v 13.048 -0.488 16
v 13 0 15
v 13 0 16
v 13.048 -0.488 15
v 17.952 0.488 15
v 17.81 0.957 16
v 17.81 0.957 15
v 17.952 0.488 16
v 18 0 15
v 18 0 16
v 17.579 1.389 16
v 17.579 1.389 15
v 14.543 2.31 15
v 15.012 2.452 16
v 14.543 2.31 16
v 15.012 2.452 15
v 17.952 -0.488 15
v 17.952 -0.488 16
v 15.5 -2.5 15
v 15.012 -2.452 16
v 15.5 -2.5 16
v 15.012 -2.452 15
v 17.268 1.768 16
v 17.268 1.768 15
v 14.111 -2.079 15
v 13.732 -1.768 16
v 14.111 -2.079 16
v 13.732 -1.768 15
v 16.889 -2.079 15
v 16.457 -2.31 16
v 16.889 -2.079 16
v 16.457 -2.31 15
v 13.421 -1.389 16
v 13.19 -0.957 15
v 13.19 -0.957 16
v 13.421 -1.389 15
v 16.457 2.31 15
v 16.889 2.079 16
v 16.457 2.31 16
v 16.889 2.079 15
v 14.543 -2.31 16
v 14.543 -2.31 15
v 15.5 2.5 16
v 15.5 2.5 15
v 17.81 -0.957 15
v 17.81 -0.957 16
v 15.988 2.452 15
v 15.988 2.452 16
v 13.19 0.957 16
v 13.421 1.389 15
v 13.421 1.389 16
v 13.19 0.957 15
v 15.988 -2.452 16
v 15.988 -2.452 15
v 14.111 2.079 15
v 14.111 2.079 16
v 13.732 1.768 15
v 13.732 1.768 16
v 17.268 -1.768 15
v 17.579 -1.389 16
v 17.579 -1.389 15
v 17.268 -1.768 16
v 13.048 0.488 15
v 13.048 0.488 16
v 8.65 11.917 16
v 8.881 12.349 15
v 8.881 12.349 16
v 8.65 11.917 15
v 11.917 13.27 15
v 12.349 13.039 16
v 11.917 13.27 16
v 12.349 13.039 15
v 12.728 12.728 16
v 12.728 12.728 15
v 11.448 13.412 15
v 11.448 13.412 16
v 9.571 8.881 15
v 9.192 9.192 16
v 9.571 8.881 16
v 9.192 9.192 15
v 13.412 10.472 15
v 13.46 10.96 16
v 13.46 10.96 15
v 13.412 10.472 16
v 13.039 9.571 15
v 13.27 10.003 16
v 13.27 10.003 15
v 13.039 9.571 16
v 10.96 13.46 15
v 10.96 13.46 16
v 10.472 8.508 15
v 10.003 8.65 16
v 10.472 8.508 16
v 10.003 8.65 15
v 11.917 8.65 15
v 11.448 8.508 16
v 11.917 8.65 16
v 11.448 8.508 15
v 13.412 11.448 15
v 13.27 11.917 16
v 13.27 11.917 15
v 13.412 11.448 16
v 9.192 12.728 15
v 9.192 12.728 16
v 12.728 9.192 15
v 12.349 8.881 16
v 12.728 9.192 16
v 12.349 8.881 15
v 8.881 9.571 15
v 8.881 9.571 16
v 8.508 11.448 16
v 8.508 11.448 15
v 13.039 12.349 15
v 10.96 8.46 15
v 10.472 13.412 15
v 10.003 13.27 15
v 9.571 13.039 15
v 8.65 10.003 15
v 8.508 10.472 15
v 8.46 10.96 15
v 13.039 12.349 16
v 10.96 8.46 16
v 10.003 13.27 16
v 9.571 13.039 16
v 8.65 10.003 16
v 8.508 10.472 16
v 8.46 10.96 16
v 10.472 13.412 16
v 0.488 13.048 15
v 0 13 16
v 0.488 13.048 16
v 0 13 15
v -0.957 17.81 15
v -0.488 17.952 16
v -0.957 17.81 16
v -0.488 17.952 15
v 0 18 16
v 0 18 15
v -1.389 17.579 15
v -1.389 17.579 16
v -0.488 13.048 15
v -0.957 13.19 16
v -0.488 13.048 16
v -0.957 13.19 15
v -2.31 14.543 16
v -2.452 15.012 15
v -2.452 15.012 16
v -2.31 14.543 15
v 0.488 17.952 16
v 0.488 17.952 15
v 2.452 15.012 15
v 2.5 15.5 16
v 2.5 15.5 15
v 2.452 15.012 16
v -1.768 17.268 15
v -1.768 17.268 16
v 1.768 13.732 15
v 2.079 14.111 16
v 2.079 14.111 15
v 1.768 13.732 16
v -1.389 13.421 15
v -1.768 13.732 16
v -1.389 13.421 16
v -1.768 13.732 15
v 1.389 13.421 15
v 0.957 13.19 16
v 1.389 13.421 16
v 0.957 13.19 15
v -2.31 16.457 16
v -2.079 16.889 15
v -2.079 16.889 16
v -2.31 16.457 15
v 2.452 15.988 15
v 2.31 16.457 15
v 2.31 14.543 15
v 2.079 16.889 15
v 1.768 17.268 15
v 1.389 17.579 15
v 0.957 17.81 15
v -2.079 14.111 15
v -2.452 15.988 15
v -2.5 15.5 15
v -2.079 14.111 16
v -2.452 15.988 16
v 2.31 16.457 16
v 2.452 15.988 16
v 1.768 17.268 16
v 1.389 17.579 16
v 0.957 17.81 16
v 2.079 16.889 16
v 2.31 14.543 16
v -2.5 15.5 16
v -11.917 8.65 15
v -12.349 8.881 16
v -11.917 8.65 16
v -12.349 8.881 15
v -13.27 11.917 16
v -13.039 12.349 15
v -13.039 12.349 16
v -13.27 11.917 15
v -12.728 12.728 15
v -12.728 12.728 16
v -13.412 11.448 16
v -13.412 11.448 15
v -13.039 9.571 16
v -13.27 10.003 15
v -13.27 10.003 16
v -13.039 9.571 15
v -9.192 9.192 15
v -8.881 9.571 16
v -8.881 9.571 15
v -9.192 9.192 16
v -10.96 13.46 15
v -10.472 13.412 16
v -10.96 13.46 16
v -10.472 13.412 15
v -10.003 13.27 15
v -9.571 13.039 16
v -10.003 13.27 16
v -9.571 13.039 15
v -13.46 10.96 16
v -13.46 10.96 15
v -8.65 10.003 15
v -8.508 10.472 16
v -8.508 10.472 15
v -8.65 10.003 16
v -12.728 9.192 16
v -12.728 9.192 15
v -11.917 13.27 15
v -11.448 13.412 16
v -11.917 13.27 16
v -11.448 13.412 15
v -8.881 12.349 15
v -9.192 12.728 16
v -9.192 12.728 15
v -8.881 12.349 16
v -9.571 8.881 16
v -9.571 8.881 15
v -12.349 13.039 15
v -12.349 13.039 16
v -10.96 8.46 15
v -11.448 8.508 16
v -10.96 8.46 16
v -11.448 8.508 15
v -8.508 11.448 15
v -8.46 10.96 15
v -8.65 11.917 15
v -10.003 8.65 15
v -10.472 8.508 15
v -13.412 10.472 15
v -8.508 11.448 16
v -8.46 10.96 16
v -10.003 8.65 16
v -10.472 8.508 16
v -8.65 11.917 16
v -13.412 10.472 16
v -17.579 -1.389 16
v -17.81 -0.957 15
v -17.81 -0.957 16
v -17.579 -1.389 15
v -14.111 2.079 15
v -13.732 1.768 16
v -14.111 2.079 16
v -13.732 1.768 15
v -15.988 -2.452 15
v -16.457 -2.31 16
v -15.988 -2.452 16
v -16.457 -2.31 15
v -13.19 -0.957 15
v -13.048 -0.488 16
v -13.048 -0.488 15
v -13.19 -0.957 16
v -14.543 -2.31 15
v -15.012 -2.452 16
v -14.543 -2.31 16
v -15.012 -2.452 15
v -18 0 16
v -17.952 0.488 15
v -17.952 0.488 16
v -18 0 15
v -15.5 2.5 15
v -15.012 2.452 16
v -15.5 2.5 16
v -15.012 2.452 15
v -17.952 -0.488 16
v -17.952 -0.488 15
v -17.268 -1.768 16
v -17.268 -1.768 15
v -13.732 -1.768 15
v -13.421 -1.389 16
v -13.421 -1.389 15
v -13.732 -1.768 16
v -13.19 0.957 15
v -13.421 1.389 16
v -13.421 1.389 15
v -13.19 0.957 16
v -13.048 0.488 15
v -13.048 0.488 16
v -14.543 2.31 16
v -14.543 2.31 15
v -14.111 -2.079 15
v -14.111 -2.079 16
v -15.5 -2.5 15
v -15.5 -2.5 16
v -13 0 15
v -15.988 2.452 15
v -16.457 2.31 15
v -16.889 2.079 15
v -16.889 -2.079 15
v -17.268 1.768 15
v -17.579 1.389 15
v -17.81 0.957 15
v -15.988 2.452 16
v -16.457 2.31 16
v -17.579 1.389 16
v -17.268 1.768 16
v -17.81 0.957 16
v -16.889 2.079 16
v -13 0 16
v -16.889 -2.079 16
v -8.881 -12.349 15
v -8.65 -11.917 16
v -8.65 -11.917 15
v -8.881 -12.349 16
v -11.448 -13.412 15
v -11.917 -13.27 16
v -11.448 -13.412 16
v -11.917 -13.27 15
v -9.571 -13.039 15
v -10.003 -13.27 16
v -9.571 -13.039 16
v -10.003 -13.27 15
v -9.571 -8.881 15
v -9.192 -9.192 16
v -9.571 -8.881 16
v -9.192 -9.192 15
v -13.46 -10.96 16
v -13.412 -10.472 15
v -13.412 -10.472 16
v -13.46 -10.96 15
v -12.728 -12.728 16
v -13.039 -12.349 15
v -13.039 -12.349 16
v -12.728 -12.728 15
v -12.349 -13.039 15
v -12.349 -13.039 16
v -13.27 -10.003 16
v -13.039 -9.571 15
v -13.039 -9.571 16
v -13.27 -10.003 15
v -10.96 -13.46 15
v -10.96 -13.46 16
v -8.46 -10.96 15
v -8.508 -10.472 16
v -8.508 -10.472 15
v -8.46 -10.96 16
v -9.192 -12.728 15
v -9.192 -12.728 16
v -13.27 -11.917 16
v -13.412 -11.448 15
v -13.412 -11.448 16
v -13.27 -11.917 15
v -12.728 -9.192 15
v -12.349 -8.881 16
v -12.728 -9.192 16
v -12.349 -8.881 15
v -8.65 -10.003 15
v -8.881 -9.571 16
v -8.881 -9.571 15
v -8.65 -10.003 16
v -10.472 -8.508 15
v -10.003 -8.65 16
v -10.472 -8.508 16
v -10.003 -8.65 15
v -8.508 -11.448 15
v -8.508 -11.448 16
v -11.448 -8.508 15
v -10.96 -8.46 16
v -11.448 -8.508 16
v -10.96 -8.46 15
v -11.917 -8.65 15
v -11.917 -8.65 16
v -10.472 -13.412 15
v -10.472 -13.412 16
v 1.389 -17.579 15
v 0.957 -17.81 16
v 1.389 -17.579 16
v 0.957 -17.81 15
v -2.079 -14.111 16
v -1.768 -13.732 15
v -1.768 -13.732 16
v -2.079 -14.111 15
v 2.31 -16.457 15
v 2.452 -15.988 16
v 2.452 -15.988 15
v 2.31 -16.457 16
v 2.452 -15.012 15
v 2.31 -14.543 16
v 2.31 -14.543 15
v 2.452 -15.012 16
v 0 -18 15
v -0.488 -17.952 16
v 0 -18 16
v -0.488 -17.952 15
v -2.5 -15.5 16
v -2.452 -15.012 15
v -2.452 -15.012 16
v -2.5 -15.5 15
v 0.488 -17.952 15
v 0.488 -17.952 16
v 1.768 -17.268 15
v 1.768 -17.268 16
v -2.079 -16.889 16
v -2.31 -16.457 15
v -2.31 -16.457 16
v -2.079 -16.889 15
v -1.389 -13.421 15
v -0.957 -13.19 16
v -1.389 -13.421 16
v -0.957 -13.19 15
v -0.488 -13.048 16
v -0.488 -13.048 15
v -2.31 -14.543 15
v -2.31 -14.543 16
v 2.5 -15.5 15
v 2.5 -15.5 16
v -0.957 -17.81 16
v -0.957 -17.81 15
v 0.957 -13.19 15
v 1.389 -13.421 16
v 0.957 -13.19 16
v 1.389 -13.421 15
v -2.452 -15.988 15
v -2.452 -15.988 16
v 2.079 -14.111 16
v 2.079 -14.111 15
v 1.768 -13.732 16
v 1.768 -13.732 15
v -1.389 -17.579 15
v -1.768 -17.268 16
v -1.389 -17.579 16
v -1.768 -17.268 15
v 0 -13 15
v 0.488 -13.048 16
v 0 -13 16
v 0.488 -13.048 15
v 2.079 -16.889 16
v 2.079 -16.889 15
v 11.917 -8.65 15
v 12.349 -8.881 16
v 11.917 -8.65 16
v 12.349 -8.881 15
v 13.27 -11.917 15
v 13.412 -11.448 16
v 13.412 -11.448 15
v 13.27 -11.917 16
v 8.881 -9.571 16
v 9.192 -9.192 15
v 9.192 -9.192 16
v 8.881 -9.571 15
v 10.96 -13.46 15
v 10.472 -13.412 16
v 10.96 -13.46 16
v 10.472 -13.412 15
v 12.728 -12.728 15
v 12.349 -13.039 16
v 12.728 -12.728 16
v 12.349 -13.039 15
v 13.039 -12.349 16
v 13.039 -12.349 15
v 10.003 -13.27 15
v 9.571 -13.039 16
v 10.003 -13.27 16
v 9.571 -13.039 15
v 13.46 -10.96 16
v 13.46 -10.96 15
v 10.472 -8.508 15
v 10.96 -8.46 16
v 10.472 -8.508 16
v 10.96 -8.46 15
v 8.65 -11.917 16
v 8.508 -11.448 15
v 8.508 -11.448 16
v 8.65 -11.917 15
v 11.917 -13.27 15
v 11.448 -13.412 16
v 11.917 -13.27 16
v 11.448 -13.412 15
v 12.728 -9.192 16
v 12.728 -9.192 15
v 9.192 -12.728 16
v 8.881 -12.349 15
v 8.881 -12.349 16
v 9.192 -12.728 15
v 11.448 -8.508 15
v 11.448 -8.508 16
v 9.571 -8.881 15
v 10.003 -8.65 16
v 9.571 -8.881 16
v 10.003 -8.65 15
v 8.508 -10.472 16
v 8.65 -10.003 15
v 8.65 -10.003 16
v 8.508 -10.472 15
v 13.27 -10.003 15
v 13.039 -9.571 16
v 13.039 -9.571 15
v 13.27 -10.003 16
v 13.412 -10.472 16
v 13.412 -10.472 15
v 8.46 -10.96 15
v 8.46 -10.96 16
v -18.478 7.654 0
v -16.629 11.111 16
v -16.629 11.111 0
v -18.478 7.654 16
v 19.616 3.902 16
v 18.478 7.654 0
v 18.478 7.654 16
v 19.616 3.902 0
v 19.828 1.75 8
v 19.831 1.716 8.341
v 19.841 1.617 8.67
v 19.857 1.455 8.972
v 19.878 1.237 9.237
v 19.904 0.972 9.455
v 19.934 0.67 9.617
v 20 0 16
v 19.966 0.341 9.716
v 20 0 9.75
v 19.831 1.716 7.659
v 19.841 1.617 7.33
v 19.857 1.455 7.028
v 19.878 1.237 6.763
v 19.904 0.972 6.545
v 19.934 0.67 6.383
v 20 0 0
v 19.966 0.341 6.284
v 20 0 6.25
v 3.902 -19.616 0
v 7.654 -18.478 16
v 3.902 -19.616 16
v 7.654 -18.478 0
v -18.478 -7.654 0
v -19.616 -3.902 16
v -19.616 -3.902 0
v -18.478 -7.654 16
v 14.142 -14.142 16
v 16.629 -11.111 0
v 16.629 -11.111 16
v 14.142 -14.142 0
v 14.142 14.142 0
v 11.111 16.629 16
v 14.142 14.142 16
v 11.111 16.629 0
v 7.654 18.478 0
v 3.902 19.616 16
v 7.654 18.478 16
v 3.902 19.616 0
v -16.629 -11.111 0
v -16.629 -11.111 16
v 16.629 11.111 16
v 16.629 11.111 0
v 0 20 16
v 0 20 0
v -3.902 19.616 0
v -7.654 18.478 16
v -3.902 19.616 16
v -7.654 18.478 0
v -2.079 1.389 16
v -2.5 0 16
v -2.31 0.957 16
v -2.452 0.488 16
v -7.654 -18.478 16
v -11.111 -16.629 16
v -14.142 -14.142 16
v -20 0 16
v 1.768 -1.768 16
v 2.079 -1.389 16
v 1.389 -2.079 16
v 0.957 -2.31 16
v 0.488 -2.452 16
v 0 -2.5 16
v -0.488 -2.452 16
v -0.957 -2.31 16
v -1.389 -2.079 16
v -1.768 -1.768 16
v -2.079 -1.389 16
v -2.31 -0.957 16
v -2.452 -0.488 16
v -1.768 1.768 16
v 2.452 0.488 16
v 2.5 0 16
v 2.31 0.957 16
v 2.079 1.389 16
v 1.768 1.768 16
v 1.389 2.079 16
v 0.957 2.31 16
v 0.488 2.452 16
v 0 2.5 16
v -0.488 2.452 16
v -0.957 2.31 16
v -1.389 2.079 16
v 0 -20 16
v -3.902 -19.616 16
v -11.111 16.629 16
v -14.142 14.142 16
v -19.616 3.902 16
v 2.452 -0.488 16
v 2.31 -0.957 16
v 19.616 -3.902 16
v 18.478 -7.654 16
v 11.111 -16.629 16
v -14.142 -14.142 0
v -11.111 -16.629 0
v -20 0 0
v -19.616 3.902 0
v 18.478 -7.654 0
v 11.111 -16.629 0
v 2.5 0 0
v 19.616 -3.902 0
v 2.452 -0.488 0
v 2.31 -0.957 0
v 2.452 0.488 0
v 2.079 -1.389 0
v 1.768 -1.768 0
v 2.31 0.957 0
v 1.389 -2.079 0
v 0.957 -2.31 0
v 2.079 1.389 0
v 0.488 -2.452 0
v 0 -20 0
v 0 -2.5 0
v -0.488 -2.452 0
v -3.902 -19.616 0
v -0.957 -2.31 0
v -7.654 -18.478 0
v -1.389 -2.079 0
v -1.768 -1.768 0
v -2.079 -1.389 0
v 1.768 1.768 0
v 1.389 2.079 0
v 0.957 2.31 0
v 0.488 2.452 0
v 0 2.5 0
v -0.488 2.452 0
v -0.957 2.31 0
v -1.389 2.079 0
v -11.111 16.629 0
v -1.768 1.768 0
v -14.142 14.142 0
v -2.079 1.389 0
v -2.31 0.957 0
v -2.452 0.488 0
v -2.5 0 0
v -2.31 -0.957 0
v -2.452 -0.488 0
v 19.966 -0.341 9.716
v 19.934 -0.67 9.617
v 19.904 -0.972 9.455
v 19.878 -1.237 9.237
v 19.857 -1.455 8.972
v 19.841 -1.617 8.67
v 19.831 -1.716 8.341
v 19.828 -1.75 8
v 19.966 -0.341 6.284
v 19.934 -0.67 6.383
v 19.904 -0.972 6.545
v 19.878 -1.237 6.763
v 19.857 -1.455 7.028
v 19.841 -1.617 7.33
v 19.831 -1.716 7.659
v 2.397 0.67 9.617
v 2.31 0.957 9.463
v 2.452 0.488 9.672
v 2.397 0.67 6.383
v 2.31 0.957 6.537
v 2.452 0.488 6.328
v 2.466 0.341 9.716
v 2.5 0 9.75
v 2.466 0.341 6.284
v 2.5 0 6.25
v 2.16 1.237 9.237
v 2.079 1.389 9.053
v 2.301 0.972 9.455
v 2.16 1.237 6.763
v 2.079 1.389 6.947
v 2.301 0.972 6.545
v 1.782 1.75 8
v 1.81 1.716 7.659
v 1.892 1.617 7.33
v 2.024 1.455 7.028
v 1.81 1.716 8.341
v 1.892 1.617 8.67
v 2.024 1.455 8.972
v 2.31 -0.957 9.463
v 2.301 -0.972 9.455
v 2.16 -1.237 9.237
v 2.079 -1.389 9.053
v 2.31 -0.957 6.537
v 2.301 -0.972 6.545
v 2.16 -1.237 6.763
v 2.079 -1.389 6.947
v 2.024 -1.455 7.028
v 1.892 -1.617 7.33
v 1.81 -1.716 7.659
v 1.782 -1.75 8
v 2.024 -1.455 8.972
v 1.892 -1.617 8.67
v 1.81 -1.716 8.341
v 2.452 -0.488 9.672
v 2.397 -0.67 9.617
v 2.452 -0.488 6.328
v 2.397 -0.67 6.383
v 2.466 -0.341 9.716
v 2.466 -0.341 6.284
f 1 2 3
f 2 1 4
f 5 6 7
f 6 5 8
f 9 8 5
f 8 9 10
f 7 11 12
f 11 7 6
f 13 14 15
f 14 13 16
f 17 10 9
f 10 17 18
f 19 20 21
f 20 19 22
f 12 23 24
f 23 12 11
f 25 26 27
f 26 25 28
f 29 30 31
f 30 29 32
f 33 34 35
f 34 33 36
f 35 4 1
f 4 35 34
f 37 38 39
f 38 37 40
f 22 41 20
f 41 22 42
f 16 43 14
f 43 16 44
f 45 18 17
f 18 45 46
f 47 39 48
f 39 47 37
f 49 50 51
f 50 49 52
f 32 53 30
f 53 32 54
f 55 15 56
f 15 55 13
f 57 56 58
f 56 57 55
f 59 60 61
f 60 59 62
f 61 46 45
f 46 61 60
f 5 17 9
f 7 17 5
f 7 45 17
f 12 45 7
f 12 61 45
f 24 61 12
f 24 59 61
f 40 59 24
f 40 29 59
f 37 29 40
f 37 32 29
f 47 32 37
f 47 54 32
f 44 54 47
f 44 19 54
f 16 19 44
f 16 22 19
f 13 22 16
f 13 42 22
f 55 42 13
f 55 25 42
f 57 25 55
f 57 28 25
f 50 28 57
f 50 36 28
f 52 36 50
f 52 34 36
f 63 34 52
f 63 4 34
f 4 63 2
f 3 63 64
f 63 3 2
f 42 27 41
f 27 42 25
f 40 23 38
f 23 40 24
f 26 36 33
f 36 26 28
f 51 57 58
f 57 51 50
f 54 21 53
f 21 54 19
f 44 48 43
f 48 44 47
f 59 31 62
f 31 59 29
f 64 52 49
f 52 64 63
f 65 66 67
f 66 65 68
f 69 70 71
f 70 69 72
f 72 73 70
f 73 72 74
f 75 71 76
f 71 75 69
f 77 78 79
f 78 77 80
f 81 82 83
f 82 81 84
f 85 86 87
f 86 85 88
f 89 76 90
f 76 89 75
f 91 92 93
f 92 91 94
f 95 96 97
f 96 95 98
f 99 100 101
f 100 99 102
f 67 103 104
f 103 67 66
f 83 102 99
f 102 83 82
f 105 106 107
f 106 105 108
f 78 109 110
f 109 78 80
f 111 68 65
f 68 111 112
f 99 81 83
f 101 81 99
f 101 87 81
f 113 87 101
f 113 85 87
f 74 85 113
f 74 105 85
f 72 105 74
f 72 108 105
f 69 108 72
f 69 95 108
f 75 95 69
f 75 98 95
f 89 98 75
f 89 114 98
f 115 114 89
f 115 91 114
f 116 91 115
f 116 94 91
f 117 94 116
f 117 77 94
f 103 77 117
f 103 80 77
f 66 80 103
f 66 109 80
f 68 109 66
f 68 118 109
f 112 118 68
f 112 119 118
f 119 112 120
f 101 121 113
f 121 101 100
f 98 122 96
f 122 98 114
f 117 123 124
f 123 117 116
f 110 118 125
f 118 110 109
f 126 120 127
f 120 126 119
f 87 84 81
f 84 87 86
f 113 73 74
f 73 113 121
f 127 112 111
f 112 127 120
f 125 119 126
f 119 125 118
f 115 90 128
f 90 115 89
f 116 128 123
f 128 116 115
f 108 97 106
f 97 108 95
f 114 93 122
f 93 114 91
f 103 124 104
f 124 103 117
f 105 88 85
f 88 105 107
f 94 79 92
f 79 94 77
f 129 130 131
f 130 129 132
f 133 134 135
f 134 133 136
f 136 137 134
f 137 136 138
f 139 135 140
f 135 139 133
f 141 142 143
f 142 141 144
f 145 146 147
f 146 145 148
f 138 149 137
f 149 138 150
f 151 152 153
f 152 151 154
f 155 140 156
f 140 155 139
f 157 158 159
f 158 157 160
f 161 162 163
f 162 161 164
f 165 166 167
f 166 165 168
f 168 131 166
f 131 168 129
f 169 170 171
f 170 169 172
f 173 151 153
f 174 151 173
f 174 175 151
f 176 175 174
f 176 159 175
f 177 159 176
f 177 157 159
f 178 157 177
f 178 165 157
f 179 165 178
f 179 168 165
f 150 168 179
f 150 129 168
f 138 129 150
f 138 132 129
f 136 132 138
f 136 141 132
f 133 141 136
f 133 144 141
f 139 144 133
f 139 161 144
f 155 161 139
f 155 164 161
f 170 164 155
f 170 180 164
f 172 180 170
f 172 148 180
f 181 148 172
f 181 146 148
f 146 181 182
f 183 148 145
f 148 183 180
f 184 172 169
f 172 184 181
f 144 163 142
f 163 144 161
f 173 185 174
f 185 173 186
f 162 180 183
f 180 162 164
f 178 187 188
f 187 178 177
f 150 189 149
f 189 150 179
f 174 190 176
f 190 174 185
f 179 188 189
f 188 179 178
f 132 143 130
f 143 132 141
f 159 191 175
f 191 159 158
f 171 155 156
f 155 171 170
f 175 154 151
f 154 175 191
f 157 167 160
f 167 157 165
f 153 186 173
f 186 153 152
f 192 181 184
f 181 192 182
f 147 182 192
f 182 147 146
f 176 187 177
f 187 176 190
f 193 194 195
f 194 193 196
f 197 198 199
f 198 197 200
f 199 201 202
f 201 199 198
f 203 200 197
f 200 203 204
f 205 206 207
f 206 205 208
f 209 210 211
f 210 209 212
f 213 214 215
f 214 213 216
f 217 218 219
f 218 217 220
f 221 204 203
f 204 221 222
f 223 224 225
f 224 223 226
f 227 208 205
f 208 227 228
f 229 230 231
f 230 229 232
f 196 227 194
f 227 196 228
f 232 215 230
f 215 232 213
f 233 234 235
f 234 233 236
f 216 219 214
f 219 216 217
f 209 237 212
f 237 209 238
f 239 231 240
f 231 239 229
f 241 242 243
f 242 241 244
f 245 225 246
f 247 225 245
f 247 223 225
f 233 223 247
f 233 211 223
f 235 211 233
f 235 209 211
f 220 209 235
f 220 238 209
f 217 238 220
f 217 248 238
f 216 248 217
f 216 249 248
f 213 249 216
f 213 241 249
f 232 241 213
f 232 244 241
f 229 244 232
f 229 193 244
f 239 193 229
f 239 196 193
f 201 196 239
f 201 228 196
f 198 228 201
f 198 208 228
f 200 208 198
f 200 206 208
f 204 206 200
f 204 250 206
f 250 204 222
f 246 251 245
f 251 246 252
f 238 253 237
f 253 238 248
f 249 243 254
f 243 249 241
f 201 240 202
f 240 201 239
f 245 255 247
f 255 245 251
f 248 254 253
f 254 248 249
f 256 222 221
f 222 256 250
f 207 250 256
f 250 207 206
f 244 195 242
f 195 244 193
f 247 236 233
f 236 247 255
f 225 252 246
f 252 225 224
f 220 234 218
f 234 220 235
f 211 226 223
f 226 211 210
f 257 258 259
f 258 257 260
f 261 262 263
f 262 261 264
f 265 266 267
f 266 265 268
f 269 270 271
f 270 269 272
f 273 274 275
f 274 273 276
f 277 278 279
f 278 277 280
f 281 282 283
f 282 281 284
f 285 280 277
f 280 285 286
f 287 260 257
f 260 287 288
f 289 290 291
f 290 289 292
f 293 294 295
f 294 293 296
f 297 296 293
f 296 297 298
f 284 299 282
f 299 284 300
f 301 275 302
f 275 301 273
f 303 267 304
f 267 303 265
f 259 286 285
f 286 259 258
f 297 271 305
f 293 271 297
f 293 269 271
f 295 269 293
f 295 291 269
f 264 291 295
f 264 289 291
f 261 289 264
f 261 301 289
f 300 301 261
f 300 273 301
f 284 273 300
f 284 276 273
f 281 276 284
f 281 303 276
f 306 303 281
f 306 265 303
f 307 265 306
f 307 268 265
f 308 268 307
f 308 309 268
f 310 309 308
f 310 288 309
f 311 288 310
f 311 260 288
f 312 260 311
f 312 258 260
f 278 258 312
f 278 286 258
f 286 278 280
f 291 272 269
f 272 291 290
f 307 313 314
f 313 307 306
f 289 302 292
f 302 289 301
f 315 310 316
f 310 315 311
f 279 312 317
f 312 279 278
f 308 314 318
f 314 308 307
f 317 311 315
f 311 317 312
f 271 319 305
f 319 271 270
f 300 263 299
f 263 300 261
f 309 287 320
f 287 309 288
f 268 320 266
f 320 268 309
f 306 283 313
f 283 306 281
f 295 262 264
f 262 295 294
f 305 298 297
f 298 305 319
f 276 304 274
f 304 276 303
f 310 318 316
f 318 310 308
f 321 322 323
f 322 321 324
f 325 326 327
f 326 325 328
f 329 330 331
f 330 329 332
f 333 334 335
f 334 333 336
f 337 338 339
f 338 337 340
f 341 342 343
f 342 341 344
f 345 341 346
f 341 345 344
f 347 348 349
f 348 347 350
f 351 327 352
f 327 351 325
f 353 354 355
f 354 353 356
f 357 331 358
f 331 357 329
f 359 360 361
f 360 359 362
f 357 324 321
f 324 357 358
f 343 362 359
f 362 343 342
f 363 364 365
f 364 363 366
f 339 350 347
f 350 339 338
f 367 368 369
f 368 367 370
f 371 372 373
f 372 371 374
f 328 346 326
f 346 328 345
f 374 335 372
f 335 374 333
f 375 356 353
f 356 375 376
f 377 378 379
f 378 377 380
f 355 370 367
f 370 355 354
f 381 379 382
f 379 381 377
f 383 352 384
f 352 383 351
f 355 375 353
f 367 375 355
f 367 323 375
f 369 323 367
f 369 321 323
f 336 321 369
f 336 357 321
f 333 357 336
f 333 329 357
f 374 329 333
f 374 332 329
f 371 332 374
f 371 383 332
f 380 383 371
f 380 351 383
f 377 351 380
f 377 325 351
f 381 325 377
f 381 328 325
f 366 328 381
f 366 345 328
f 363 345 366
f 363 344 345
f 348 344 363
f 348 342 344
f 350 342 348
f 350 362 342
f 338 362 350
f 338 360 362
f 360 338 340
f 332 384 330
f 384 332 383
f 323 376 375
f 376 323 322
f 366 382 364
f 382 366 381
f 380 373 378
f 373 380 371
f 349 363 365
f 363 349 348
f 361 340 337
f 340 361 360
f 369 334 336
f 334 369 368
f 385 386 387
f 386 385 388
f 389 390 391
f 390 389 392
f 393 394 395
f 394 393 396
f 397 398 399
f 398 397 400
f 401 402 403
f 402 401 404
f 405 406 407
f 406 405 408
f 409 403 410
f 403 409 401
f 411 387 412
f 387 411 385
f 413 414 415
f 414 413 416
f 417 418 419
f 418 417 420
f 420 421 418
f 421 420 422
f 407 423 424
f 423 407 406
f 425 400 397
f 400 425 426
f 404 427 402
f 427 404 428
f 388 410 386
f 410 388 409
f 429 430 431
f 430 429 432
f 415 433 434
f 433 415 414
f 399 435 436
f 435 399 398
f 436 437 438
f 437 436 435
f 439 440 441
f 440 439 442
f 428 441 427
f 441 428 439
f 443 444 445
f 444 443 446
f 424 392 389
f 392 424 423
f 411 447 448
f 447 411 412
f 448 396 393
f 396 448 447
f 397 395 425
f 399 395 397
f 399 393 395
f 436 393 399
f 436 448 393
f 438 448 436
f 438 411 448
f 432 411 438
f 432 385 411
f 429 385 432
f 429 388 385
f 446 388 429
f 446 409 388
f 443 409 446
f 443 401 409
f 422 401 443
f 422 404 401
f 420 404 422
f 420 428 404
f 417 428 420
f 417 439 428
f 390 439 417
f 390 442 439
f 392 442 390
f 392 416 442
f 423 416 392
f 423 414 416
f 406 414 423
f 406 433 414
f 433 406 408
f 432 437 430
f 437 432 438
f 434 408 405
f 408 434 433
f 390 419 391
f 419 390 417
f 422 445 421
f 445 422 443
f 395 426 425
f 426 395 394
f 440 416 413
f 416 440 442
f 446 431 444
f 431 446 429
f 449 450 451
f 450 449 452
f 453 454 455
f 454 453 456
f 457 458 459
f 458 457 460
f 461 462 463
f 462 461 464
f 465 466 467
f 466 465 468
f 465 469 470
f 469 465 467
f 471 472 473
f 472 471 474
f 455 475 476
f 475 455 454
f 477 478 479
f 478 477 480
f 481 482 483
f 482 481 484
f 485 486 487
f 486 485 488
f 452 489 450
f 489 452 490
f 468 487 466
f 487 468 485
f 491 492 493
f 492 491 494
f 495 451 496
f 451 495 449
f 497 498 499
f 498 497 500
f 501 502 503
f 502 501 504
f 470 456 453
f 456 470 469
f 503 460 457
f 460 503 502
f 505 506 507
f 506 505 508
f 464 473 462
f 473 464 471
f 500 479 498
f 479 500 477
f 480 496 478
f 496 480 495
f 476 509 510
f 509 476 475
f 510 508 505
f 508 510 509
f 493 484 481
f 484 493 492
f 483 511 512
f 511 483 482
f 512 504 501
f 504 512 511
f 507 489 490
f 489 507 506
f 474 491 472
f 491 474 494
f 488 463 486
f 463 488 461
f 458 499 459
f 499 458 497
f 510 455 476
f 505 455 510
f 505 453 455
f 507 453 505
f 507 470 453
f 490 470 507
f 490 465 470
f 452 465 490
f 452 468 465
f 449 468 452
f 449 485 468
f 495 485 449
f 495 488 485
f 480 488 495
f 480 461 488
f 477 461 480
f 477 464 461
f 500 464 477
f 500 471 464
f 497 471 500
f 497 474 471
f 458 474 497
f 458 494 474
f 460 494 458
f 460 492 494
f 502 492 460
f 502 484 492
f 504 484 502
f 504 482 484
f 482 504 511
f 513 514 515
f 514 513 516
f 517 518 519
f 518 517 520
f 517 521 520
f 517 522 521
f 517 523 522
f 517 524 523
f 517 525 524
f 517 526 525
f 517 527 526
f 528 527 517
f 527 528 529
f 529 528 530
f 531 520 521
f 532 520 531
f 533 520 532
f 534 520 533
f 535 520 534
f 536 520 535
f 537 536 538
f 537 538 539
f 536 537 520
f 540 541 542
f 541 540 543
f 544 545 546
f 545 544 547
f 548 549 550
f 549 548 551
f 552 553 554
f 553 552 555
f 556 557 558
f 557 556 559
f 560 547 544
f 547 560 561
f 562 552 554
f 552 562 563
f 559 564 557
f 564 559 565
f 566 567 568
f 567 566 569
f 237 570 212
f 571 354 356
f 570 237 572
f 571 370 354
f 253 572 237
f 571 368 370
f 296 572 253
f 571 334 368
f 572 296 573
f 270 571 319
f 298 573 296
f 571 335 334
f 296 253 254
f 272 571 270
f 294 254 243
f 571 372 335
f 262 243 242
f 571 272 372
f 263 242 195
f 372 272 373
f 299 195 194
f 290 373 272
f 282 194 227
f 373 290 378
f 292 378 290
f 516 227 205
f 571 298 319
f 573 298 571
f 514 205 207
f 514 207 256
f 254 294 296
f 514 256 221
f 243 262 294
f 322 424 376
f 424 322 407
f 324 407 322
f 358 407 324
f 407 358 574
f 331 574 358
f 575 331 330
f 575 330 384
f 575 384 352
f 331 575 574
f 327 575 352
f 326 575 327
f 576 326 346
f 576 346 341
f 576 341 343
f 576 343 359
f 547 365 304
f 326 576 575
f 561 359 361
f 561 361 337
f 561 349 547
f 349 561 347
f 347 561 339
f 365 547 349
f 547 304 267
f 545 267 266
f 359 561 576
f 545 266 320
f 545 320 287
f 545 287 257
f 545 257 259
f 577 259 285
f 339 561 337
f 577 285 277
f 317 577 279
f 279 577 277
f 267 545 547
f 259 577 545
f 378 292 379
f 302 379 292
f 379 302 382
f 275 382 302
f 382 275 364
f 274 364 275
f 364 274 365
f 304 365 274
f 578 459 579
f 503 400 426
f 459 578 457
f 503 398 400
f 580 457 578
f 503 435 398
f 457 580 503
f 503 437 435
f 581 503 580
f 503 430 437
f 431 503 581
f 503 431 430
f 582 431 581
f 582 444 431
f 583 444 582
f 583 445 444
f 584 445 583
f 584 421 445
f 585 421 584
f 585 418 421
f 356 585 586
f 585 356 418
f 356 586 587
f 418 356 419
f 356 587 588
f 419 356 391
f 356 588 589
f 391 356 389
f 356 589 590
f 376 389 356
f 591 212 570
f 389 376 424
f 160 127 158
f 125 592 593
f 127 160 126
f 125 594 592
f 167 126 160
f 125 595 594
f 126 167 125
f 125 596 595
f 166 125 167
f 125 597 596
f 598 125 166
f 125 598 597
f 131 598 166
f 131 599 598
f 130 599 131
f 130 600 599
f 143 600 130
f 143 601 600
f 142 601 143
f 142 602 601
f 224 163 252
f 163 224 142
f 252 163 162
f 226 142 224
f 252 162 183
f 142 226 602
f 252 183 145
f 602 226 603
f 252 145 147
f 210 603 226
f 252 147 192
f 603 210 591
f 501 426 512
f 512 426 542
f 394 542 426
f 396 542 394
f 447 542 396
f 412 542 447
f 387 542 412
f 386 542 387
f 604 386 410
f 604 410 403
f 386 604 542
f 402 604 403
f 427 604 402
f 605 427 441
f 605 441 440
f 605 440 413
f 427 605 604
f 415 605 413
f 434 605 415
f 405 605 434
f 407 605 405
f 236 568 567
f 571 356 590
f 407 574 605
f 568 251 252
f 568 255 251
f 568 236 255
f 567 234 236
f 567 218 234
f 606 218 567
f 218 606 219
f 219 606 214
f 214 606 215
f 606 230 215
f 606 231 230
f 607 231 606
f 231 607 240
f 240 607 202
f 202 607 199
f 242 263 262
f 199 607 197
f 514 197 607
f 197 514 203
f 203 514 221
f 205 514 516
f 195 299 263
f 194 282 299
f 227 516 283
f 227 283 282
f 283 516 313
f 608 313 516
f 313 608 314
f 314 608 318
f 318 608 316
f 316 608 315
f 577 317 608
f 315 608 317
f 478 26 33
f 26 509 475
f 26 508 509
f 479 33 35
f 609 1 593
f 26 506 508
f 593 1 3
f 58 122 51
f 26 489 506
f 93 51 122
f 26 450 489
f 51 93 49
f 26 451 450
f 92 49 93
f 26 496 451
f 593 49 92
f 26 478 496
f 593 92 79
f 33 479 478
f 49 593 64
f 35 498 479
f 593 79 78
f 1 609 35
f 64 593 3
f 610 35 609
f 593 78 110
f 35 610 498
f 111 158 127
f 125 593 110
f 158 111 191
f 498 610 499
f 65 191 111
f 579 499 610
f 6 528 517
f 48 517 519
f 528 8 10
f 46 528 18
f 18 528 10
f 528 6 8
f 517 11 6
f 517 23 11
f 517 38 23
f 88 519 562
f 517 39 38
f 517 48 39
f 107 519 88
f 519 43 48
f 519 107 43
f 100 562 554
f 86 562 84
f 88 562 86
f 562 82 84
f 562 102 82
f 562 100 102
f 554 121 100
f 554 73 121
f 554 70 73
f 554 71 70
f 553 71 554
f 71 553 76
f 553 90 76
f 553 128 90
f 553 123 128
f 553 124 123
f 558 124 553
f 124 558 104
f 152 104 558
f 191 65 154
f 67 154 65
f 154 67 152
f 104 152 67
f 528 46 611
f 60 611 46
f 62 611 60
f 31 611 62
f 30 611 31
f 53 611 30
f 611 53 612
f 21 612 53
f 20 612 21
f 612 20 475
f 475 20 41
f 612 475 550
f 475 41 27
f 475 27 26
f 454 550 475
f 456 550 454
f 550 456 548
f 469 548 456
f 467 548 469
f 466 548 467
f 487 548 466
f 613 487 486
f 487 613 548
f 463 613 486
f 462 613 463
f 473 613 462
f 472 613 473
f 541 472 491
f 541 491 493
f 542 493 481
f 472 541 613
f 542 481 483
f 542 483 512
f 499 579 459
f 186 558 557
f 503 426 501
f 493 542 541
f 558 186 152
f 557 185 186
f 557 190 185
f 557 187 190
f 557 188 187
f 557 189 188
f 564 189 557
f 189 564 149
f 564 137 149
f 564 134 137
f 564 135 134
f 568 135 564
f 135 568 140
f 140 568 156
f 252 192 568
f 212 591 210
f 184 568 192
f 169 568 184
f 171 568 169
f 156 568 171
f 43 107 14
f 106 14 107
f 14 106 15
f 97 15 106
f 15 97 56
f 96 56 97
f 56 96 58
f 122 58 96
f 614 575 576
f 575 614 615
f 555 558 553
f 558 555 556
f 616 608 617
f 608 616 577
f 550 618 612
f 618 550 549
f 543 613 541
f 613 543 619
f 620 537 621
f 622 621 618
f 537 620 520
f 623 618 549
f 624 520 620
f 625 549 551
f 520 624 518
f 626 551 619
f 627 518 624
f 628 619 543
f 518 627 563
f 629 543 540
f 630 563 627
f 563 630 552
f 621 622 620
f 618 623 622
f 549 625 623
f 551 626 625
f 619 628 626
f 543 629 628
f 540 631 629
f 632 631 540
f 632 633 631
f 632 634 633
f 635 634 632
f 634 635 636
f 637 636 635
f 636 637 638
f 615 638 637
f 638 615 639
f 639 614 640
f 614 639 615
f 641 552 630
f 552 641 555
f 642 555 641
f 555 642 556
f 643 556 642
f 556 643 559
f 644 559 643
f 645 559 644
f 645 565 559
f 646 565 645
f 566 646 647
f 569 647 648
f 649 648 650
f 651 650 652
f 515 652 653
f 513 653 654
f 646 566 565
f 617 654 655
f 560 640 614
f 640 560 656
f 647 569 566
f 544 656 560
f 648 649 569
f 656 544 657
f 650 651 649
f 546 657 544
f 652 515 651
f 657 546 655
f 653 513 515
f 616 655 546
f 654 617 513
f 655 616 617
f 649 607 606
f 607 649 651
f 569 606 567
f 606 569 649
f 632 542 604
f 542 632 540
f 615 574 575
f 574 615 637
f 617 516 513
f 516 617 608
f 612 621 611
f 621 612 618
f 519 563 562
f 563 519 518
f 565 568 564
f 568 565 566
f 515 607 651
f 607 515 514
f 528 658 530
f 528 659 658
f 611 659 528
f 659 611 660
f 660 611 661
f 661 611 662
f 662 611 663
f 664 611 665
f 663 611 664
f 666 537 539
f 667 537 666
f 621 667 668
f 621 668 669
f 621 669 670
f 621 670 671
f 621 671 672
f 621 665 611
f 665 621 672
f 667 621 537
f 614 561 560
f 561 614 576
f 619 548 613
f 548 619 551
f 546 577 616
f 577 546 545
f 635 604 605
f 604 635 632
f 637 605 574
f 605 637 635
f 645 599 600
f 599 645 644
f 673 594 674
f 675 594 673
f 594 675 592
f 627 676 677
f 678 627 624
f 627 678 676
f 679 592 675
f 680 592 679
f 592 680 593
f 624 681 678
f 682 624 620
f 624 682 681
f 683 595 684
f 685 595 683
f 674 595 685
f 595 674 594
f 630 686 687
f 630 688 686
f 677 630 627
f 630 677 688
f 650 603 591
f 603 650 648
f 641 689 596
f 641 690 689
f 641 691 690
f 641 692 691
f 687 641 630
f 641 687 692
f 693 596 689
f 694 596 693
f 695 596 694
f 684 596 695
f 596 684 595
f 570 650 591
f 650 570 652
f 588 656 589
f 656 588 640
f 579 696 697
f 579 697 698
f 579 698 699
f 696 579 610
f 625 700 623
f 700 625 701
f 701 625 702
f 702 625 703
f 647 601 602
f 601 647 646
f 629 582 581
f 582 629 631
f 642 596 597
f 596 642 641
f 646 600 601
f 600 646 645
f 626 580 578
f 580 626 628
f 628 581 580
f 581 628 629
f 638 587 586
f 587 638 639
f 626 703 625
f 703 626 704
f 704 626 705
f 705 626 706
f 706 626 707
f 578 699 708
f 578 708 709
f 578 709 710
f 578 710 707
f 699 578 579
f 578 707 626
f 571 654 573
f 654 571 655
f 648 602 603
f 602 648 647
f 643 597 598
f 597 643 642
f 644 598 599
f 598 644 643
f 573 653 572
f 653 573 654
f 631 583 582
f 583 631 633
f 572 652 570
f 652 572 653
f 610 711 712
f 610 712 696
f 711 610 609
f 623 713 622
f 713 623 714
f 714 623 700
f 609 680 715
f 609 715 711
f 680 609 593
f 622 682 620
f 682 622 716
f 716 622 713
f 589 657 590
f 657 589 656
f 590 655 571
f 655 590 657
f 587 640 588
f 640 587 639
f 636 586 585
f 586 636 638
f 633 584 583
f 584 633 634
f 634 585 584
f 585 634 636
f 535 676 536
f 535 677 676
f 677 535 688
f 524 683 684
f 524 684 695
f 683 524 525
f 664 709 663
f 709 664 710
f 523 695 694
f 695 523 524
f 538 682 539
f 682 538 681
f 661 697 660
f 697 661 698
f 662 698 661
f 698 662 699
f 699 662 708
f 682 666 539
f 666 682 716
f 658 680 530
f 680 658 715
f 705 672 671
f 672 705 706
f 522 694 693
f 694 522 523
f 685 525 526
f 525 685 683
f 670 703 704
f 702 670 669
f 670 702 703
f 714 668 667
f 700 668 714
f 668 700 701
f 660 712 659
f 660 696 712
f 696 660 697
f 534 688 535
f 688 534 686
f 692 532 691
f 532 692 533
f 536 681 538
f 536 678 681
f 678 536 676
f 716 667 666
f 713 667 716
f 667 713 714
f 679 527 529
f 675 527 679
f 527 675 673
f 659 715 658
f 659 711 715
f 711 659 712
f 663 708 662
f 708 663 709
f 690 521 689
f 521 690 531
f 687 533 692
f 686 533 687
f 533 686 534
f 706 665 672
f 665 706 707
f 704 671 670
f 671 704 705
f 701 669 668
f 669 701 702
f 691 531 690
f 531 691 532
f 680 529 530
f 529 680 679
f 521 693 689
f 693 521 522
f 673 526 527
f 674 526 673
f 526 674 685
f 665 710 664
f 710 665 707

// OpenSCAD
$fn = 32;

// ----------------------------------------------------------------------
// Control knob: dimpled knob
// ----------------------------------------------------------------------

// --- parameters (mm) ---
dimp_d = 5;               // finger dimple diameter
n_dimp = 8;               // number of dimples
dimp_r = 15.5;            // dimple ring radius
knob_d = 40;              // knob body diameter
knob_h = 16;              // knob body height
bore_d = 5;               // shaft bore diameter
set_d = 3.5;              // set screw bore diameter

dimp_step = 360 / n_dimp;  // dimple angular step

difference() {
  cylinder(h = knob_h, d = knob_d);
  translate([0, 0, -1]) cylinder(h = knob_h + 2, d = bore_d);
  translate([-1, 0, knob_h / 2]) rotate([0, 90, 0])
    cylinder(h = knob_d / 2 + bore_d / 2 + 2, d = set_d);  for (i = [0 : n_dimp - 1])
    rotate([0, 0, i * dimp_step])
      translate([dimp_r, 0, knob_h - 1])
        cylinder(h = 2, d = dimp_d);
}
